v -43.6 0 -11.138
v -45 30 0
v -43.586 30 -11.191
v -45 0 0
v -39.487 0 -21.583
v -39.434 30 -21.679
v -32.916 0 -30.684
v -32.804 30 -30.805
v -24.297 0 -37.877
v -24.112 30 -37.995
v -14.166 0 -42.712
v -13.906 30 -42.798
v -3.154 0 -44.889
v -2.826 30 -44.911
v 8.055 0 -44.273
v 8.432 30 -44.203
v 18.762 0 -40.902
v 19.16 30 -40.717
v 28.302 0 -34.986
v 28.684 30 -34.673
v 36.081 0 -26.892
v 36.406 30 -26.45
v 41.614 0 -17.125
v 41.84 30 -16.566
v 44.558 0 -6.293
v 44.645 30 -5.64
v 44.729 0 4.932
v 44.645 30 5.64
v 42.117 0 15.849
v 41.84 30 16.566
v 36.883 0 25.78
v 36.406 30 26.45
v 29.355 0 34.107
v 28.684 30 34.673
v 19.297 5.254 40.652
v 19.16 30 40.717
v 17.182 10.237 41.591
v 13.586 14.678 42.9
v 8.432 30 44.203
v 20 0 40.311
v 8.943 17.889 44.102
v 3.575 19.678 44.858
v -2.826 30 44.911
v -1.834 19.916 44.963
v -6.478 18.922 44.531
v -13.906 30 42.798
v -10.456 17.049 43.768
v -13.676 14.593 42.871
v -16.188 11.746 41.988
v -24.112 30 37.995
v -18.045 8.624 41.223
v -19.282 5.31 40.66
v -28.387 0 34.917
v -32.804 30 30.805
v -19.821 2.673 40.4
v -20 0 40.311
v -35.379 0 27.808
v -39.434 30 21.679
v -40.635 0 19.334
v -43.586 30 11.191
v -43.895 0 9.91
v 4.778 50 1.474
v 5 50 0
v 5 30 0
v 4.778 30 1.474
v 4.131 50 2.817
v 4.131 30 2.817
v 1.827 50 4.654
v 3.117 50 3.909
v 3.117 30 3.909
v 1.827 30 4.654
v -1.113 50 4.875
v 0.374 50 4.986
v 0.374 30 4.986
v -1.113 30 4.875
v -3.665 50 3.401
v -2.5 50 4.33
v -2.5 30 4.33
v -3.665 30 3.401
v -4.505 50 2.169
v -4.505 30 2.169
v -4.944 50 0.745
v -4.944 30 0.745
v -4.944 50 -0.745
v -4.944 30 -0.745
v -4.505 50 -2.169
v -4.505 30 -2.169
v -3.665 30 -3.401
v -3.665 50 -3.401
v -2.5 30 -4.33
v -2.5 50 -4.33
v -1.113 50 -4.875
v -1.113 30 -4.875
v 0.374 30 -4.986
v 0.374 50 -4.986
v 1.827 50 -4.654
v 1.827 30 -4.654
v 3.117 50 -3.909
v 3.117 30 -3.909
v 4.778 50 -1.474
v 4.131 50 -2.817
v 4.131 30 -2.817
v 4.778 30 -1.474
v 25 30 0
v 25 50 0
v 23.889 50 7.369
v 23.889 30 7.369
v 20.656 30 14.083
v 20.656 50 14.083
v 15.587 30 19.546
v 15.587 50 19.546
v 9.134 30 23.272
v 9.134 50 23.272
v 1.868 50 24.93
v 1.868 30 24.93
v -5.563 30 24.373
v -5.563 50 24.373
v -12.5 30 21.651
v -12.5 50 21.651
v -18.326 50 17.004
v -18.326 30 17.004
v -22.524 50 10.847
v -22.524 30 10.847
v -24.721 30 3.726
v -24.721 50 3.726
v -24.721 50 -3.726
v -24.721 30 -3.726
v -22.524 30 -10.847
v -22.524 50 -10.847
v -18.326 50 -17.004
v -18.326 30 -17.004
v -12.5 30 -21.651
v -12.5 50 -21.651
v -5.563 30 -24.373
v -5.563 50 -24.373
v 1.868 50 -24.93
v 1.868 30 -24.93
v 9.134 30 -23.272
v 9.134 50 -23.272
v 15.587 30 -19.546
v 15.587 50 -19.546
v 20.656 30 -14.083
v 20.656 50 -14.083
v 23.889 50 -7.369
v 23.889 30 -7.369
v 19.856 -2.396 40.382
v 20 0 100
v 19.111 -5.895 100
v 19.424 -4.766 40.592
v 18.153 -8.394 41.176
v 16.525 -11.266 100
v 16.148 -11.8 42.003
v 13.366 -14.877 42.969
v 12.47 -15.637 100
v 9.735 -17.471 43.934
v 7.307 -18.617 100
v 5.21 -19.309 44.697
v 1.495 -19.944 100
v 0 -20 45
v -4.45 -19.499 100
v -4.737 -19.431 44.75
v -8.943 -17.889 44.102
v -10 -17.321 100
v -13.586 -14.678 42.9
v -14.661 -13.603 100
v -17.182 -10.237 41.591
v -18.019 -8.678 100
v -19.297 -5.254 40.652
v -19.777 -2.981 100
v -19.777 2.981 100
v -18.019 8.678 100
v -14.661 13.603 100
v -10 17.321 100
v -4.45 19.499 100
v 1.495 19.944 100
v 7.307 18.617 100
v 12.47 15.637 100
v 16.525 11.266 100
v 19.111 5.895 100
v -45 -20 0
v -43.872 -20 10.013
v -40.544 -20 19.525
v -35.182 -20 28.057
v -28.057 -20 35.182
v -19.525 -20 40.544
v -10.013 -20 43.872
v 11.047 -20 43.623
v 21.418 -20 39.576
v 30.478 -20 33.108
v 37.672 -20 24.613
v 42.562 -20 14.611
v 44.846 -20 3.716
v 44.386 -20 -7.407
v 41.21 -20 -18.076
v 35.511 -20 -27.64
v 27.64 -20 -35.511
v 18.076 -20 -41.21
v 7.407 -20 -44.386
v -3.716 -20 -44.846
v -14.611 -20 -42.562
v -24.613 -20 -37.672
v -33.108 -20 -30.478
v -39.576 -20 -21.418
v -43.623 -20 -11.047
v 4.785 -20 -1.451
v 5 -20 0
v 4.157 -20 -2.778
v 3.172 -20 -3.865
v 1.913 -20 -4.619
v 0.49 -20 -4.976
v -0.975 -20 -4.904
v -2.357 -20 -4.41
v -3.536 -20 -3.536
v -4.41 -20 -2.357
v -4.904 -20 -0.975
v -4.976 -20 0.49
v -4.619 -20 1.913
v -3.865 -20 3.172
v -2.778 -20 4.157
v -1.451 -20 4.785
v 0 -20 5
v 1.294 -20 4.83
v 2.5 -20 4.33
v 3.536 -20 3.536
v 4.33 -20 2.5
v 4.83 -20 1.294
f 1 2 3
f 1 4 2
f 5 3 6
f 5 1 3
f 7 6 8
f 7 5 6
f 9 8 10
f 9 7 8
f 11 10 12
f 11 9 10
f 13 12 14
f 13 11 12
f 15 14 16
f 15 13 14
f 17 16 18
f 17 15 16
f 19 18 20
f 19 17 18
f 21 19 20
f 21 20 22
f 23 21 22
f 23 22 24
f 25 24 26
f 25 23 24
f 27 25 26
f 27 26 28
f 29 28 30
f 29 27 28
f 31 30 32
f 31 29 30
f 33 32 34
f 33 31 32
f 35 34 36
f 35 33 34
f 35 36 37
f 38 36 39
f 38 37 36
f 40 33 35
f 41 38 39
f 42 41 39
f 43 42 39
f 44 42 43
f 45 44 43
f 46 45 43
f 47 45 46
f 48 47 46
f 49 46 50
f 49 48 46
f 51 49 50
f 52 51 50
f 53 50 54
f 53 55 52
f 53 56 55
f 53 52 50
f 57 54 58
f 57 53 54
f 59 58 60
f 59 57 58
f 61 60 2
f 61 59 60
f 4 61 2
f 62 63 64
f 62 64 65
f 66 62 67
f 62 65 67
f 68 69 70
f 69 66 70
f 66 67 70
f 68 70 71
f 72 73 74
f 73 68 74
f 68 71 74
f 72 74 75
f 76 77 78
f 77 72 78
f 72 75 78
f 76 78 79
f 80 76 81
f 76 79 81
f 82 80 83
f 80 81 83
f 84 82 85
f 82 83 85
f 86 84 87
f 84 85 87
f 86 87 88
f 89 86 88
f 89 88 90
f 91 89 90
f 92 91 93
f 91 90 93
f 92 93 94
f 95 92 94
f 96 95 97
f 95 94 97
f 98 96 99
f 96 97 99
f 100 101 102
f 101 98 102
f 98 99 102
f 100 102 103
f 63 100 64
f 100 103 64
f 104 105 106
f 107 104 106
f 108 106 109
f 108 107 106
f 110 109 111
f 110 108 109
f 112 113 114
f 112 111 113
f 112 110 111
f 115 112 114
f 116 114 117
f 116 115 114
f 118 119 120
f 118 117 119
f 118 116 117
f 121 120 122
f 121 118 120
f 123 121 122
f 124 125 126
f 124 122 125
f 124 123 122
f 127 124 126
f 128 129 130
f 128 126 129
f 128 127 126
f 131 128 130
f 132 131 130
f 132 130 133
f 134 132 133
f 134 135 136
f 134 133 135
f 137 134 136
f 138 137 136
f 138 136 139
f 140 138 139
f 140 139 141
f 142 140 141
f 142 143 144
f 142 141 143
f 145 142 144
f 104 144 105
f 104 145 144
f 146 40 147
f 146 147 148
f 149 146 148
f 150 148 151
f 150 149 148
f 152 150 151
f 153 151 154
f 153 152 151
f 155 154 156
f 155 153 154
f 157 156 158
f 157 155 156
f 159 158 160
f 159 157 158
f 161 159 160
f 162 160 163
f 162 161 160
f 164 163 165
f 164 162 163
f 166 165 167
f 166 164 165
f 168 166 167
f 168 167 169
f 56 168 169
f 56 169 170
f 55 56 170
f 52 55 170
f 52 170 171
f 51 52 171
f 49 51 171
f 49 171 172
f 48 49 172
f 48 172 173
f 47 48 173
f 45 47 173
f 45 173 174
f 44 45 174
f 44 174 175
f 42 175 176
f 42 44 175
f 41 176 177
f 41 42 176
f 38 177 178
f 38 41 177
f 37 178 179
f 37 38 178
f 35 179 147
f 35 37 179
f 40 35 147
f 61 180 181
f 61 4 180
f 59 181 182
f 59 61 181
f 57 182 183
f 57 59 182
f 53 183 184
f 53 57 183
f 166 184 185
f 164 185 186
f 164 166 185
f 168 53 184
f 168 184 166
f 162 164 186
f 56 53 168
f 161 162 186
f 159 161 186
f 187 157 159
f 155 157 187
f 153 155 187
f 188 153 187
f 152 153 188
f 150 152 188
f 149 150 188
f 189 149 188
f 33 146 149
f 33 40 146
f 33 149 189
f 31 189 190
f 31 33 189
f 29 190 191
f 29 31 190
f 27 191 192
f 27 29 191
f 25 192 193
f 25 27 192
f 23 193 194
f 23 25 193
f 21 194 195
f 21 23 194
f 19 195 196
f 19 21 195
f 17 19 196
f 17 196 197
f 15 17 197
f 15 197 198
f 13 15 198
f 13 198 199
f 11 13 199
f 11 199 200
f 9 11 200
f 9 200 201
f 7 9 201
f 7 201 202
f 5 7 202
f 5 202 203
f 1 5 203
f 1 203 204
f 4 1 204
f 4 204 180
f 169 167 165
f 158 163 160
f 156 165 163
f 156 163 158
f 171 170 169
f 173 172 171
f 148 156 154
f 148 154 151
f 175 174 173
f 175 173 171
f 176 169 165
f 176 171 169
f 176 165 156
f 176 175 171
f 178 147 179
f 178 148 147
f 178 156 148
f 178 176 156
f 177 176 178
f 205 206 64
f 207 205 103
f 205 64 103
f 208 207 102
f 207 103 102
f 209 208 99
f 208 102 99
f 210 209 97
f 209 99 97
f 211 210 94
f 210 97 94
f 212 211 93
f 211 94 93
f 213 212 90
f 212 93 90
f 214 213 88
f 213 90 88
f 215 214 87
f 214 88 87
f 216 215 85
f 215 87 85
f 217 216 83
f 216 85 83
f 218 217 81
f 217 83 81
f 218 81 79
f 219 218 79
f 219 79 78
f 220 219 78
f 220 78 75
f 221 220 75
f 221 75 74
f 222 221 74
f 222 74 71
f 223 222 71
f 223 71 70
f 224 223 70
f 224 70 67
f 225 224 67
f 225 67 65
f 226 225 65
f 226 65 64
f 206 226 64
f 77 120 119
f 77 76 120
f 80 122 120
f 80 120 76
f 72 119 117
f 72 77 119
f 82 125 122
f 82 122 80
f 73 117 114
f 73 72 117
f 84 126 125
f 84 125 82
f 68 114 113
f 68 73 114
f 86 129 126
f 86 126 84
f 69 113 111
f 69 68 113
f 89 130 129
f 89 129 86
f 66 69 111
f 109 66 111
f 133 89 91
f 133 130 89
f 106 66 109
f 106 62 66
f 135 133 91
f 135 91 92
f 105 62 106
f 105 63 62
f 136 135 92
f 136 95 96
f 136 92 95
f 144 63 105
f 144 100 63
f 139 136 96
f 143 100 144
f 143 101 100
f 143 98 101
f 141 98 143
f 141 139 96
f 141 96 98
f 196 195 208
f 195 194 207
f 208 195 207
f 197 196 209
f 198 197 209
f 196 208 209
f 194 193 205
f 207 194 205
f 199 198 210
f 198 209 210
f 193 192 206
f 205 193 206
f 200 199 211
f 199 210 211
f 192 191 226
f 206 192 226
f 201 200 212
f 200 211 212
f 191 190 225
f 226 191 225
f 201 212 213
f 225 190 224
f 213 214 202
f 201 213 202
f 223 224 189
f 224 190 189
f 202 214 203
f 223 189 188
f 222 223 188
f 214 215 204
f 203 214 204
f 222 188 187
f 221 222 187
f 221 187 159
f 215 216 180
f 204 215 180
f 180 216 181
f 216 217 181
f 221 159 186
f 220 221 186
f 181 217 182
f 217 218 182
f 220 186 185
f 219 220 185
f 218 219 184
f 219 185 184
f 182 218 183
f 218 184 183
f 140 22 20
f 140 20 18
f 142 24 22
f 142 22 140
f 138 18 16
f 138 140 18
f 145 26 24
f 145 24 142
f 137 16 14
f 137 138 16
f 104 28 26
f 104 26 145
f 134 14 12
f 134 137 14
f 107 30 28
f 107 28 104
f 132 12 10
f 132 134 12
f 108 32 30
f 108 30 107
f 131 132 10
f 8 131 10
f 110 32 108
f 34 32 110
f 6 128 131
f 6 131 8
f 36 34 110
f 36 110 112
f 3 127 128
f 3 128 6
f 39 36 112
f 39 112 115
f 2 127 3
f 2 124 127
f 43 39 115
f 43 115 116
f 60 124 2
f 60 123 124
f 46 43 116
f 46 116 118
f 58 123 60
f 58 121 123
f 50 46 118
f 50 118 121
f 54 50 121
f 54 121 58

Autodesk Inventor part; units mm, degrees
ref_plane "YZ Plane" through (0, 0, 0) normal (1, 0, 0) x (0, 1, 0)
ref_plane "XZ Plane" through (0, 0, 0) normal (0, 1, 0) x (-1, 0, 0)
ref_plane "XY Plane" through (0, 0, 0) normal (0, 0, 1) x (1, 0, 0)
sketch "Sketch1" plane through (0, 0, 0) normal (0, 0, 1) x (1, 0, 0)
  circle A0 centre (0, 0) radius 20
  dimension "d0" = 40
extrude "Extrusion1" add sketch "Sketch1" along normal blind 100
sketch "Sketch2" plane through (0, 0, 0) normal (0, 1, 0) x (-1, 0, 0)
  line L0 (20, 0) -> (-20, 0) projected
  circle A0 centre (0, 0) radius 45
  dimension "d3" = 90
extrude "Extrusion2" add sketch "Sketch2" along normal blind 30 and the other way blind 20
sketch "Sketch4" plane through (0, 30, 0) normal (0, 1, 0) x (1, 0, 0)
  circle A0 centre (0, 0) radius 5
  dimension "d9" = 10
extrude "Extrusion4" cut sketch "Sketch4" along normal through all both and the other way through all
sketch "Sketch6" plane through (0, 30, 0) normal (0, 1, 0) x (1, 0, 0)
  circle A0 centre (0, 0) radius 5 projected
  circle A1 centre (0, 0) radius 25
  circle A2 centre (0, 0) radius 15
  dimension "d15" = 50
  dimension "d16" = 30
extrude "Extrusion6" add sketch "Sketch6" along normal blind 20 contours A1 | A2
properties part number "End Link 2"
